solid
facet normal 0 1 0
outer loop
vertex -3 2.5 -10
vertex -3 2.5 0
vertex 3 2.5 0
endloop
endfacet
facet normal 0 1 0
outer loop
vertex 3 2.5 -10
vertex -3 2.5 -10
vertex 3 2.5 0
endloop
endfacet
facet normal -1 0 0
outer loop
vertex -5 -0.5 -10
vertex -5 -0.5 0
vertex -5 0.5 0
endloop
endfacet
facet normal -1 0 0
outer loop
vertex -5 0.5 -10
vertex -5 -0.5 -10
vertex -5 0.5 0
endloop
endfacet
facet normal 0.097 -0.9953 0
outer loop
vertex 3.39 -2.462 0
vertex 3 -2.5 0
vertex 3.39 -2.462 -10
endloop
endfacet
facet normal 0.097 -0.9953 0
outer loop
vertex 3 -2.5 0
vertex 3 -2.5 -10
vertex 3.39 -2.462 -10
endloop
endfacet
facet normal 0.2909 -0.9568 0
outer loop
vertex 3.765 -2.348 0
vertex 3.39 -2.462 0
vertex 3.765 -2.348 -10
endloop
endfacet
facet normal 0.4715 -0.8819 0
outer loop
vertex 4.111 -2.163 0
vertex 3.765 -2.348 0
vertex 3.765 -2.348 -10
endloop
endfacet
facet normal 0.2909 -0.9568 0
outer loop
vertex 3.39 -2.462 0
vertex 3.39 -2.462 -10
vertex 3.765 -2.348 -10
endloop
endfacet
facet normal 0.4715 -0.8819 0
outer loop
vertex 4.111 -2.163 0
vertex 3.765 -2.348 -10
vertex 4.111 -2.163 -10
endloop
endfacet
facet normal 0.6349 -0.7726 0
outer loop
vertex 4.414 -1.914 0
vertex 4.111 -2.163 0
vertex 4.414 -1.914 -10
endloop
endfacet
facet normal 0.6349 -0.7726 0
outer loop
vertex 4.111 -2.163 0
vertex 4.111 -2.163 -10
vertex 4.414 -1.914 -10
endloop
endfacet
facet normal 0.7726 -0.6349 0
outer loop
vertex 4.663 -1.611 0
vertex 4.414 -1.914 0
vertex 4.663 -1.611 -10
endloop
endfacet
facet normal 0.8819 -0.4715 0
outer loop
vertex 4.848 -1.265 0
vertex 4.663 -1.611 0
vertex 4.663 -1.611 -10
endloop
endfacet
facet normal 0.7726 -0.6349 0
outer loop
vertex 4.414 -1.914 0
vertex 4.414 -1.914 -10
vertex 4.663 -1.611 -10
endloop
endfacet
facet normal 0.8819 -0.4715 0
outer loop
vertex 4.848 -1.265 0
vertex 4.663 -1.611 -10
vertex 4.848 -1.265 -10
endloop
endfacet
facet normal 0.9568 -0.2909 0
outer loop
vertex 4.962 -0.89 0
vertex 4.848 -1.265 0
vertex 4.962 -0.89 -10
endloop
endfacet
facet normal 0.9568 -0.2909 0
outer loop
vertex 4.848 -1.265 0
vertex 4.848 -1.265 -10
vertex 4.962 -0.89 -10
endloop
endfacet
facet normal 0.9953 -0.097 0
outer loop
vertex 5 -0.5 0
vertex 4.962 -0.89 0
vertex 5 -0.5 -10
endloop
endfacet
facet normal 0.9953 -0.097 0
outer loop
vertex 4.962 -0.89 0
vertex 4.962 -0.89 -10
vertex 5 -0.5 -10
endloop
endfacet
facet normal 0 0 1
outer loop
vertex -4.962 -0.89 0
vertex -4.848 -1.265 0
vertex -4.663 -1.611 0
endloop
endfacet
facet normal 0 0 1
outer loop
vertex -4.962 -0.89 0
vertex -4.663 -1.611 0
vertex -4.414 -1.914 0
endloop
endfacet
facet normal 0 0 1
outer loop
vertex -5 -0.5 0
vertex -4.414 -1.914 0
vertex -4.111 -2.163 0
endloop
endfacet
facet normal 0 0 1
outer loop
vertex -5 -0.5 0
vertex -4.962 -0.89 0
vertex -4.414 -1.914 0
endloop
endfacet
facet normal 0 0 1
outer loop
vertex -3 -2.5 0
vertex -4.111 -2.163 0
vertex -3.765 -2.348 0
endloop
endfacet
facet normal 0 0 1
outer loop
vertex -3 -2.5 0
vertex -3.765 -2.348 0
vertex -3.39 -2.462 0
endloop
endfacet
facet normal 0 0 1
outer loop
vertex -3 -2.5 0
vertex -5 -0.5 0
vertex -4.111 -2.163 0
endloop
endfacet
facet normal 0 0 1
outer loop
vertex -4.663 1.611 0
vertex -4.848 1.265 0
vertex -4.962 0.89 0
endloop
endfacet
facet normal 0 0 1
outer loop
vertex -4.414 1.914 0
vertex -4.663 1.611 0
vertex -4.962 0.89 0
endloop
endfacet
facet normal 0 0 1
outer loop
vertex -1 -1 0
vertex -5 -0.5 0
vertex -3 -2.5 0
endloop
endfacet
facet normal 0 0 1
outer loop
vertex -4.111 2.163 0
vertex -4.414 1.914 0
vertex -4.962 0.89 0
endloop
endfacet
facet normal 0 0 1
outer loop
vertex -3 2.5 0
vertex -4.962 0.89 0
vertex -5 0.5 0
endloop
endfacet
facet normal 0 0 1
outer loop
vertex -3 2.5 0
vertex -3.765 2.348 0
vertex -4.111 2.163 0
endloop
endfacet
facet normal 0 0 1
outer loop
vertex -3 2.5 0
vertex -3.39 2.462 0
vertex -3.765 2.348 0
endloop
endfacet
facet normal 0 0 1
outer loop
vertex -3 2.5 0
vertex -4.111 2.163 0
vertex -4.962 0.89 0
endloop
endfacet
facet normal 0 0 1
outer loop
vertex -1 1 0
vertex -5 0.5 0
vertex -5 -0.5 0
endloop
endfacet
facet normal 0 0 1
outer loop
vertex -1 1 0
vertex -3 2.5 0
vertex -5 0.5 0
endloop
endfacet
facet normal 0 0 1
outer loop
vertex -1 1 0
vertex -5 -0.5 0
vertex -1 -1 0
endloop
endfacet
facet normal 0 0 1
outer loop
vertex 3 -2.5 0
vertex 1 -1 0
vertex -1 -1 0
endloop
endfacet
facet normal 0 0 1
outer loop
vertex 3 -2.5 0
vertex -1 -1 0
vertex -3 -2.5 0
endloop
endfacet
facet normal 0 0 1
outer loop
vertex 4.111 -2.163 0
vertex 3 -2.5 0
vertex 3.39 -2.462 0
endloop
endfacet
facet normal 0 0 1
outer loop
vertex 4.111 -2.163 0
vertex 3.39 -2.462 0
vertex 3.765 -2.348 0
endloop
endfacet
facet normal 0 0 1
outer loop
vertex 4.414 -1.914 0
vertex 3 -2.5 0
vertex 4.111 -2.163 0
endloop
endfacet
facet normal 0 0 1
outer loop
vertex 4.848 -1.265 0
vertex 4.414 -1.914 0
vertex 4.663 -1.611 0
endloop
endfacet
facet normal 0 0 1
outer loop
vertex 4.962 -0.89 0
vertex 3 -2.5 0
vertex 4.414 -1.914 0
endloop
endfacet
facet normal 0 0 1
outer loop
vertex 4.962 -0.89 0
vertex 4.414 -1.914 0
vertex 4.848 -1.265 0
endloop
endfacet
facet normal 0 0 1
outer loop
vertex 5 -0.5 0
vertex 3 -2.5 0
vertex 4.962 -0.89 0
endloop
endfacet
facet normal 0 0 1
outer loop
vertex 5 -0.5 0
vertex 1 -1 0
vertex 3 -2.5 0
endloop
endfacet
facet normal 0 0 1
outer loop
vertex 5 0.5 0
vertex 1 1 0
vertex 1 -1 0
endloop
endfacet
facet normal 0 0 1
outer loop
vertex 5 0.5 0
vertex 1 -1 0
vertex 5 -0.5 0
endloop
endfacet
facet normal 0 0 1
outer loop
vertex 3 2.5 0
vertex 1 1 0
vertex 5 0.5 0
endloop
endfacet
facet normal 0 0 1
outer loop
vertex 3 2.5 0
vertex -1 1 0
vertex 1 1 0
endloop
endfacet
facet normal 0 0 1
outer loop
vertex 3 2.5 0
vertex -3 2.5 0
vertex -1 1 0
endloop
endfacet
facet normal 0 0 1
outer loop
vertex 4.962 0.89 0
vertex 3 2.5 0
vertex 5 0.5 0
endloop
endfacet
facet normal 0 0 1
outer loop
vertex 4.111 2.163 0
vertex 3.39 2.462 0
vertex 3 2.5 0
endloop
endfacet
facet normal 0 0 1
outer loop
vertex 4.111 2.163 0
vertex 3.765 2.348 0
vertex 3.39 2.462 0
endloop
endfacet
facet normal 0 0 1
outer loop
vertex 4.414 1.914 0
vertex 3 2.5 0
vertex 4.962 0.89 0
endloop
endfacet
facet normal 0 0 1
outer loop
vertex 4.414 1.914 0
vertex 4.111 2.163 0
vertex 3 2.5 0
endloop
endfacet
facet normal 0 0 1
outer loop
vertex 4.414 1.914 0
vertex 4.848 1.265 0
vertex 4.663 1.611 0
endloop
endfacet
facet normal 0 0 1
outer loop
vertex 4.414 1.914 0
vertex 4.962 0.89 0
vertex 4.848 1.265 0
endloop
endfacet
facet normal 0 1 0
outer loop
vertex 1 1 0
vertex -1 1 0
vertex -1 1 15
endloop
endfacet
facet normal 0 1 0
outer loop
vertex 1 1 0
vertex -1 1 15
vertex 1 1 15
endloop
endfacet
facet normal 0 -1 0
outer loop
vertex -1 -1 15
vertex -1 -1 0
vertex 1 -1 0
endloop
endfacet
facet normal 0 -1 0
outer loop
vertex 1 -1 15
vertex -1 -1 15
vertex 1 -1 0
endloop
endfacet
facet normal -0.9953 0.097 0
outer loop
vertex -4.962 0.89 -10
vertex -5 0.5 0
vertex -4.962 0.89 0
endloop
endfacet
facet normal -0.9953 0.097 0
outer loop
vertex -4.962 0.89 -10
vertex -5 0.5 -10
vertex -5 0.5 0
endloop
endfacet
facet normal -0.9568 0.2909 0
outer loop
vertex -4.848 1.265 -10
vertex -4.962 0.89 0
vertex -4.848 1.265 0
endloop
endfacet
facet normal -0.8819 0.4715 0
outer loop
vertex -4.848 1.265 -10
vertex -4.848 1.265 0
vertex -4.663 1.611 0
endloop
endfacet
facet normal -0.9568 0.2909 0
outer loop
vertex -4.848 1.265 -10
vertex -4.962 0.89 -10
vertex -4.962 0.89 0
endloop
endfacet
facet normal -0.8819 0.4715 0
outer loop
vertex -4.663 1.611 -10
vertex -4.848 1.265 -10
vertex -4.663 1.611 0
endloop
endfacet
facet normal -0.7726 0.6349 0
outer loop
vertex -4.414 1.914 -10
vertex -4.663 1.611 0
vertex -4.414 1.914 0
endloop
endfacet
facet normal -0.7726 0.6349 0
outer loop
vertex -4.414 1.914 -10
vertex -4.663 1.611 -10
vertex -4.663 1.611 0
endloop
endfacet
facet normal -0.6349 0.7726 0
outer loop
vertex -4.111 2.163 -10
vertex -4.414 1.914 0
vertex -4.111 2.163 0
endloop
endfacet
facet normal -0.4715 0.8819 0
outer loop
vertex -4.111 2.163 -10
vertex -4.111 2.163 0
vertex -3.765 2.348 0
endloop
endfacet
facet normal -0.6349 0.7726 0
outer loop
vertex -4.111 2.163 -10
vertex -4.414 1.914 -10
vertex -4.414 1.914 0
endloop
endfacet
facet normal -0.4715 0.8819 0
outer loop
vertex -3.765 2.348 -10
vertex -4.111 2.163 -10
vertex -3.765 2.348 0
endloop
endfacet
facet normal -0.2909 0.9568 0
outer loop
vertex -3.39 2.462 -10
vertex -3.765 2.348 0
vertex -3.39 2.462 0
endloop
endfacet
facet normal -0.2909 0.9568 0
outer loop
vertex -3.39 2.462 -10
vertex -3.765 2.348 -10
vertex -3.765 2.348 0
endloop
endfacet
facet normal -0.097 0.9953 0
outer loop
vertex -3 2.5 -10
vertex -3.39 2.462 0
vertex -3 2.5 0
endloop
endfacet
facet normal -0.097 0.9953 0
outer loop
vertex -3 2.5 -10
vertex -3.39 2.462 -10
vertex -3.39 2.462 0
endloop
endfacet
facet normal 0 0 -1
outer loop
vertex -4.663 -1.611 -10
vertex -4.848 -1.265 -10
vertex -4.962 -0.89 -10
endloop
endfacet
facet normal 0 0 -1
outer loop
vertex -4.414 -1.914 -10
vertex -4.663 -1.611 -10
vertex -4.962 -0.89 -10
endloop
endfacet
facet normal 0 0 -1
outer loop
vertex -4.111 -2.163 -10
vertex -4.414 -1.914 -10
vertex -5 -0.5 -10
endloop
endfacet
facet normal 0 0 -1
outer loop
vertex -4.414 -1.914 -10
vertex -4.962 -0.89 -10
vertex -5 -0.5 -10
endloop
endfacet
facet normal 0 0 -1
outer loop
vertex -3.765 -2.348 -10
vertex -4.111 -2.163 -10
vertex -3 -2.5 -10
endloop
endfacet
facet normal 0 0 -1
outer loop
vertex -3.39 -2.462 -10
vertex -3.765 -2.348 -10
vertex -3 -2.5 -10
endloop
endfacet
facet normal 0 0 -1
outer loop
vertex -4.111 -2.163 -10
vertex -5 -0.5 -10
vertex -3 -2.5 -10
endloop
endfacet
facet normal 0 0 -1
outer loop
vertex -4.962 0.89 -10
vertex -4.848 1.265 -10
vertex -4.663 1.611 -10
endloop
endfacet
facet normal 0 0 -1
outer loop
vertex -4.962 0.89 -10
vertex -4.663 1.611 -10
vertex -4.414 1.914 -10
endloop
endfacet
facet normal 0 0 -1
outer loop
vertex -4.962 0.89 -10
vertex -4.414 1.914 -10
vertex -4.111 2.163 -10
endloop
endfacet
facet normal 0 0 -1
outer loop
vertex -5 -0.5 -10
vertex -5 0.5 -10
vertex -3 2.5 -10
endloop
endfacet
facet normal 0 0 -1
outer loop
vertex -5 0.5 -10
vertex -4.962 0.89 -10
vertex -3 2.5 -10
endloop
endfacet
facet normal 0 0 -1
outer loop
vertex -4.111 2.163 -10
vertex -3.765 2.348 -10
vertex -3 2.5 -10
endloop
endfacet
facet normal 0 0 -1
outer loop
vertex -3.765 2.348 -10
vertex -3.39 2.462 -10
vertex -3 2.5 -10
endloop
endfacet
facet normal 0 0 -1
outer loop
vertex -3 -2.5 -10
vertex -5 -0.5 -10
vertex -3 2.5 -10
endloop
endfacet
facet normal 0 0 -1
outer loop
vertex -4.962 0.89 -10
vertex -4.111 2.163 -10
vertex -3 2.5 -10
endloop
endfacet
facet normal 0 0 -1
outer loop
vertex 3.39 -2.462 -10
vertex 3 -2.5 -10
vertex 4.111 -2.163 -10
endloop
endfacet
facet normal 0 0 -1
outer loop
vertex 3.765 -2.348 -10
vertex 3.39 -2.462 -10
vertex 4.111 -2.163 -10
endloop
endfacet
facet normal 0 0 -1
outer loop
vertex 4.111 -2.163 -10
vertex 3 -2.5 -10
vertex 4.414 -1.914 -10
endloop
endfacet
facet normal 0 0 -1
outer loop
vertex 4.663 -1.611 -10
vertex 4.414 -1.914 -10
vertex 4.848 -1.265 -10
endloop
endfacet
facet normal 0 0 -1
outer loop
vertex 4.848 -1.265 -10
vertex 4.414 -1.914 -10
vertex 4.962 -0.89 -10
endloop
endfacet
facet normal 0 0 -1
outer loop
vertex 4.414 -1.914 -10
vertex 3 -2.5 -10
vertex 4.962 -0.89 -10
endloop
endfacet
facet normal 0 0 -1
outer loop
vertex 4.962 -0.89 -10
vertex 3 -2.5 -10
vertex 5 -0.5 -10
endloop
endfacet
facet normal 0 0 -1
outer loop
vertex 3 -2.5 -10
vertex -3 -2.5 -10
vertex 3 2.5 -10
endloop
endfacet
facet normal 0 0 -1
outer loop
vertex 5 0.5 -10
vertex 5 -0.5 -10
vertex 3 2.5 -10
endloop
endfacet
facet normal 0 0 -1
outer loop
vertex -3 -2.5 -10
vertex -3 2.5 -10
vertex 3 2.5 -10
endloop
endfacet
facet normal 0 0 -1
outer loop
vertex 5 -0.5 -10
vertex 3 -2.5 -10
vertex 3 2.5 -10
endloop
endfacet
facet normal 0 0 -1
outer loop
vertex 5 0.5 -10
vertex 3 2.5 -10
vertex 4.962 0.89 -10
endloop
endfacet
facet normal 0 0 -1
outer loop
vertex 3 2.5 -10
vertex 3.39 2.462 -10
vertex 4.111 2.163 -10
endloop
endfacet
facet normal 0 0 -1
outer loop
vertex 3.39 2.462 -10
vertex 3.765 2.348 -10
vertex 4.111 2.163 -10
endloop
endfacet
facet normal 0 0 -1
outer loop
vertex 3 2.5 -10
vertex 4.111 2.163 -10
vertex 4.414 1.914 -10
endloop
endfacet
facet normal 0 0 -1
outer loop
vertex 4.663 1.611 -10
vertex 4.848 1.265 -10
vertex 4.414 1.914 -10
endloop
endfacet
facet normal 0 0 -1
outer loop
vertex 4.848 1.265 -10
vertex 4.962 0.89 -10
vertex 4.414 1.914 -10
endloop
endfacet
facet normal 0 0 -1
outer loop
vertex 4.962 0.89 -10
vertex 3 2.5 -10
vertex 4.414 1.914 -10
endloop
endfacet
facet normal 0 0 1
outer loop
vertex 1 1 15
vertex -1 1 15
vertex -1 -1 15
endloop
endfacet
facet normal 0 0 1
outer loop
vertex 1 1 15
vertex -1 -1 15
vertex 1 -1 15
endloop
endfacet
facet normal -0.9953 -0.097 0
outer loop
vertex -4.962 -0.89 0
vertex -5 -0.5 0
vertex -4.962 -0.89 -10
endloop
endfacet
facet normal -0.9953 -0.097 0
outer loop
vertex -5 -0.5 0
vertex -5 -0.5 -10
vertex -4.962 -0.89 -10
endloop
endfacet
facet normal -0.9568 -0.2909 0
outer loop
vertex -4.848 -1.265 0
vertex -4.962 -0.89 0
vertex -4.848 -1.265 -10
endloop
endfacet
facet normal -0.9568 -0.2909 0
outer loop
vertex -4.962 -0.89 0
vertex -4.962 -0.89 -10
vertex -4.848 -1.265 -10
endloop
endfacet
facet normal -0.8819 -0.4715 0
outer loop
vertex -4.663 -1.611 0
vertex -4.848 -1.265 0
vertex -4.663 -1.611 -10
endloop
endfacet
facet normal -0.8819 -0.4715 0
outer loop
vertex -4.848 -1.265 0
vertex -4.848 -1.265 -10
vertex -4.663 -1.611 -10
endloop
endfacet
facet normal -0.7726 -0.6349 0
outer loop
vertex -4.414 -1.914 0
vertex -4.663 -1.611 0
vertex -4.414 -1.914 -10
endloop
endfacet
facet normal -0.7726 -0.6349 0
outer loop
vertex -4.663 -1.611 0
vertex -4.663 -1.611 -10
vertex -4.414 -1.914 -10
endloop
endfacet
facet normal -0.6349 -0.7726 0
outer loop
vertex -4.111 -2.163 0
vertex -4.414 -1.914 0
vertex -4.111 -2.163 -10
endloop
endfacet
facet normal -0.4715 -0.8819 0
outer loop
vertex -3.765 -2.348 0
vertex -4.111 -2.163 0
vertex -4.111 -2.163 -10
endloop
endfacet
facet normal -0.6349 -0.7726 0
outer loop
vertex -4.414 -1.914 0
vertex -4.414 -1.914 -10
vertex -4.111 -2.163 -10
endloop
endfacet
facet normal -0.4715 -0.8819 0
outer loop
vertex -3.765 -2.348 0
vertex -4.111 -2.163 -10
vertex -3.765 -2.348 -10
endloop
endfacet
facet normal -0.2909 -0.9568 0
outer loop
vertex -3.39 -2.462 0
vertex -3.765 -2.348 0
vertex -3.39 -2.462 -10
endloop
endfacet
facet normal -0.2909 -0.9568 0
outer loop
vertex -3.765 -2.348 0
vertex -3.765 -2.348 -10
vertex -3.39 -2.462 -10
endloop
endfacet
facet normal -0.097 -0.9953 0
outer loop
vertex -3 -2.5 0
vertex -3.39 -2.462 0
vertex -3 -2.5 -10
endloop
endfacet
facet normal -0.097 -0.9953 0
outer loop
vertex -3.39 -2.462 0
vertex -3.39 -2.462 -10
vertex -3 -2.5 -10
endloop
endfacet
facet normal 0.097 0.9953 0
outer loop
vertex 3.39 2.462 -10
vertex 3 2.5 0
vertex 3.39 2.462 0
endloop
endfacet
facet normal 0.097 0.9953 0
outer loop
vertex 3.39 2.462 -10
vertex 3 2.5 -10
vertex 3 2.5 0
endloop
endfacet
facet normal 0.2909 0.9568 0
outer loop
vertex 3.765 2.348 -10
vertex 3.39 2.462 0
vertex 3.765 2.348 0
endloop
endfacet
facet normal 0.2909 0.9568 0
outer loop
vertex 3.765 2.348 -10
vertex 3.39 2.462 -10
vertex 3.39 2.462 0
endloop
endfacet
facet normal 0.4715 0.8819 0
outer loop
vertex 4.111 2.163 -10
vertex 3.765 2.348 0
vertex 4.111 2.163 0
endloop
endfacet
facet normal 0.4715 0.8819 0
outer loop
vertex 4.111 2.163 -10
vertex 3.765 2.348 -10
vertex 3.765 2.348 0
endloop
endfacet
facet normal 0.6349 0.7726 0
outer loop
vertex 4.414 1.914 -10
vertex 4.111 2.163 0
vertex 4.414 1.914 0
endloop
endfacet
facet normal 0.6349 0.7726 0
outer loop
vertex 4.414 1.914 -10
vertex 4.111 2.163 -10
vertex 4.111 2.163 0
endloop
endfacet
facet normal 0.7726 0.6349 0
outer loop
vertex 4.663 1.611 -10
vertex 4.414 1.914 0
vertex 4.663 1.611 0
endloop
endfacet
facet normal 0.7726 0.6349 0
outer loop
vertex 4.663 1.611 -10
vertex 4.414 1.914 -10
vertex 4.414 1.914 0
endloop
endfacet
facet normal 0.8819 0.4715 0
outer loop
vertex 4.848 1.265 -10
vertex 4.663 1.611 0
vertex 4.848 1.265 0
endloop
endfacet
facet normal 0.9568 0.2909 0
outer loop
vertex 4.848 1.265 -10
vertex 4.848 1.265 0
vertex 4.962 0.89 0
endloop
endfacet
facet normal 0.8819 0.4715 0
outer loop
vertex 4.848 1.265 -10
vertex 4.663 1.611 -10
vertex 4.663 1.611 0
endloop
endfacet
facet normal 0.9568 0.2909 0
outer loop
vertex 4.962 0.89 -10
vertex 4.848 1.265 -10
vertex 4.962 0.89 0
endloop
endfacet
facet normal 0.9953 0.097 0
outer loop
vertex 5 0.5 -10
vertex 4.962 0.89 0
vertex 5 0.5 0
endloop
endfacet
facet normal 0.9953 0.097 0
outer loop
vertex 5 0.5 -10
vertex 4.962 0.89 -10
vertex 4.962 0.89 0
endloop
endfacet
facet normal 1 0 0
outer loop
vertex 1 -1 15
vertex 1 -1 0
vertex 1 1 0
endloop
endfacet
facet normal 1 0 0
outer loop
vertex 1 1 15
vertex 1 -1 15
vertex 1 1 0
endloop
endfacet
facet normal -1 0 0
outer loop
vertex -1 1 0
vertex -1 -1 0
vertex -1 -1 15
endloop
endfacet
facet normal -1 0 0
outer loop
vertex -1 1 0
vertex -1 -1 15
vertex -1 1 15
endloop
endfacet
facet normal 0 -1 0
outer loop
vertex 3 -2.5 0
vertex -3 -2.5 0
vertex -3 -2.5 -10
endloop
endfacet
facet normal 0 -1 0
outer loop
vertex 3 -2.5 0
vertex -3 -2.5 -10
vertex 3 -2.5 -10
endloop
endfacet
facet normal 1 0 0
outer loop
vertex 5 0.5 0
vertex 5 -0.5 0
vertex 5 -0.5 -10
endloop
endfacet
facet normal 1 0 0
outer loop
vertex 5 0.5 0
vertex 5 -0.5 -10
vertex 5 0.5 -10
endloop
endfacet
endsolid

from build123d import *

# Parameters (mm, degrees)
F0_W     = 10
F0_H     = 5
F0_W_2   = 2
F0_H_2   = 2
F1_DEPTH = 10
F2_DEPTH = 15
F3_R     = 2


with BuildPart() as f1:
    # F0 (on Top) → F1 (new body)
    with BuildSketch(Plane.XY):
        Rectangle(F0_W, F0_H)
        Rectangle(F0_W_2, F0_H_2, mode=Mode.SUBTRACT)
        Rectangle(F0_W_2, F0_H_2)
    extrude(amount=-F1_DEPTH)

    # F0 (on Top) → F2 (join)
    with BuildSketch(Plane.XY):
        Rectangle(F0_W_2, F0_H_2)
    extrude(amount=F2_DEPTH)

    # F3
    f3_edges = [f1.edges().sort_by_distance(p)[0] for p in [
        (5, -2.5, -5),
        (-5, -2.5, -5),
        (-5, 2.5, -5),
        (5, 2.5, -5),
    ]]
    fillet(f3_edges, radius=F3_R)


solid = f1.part
